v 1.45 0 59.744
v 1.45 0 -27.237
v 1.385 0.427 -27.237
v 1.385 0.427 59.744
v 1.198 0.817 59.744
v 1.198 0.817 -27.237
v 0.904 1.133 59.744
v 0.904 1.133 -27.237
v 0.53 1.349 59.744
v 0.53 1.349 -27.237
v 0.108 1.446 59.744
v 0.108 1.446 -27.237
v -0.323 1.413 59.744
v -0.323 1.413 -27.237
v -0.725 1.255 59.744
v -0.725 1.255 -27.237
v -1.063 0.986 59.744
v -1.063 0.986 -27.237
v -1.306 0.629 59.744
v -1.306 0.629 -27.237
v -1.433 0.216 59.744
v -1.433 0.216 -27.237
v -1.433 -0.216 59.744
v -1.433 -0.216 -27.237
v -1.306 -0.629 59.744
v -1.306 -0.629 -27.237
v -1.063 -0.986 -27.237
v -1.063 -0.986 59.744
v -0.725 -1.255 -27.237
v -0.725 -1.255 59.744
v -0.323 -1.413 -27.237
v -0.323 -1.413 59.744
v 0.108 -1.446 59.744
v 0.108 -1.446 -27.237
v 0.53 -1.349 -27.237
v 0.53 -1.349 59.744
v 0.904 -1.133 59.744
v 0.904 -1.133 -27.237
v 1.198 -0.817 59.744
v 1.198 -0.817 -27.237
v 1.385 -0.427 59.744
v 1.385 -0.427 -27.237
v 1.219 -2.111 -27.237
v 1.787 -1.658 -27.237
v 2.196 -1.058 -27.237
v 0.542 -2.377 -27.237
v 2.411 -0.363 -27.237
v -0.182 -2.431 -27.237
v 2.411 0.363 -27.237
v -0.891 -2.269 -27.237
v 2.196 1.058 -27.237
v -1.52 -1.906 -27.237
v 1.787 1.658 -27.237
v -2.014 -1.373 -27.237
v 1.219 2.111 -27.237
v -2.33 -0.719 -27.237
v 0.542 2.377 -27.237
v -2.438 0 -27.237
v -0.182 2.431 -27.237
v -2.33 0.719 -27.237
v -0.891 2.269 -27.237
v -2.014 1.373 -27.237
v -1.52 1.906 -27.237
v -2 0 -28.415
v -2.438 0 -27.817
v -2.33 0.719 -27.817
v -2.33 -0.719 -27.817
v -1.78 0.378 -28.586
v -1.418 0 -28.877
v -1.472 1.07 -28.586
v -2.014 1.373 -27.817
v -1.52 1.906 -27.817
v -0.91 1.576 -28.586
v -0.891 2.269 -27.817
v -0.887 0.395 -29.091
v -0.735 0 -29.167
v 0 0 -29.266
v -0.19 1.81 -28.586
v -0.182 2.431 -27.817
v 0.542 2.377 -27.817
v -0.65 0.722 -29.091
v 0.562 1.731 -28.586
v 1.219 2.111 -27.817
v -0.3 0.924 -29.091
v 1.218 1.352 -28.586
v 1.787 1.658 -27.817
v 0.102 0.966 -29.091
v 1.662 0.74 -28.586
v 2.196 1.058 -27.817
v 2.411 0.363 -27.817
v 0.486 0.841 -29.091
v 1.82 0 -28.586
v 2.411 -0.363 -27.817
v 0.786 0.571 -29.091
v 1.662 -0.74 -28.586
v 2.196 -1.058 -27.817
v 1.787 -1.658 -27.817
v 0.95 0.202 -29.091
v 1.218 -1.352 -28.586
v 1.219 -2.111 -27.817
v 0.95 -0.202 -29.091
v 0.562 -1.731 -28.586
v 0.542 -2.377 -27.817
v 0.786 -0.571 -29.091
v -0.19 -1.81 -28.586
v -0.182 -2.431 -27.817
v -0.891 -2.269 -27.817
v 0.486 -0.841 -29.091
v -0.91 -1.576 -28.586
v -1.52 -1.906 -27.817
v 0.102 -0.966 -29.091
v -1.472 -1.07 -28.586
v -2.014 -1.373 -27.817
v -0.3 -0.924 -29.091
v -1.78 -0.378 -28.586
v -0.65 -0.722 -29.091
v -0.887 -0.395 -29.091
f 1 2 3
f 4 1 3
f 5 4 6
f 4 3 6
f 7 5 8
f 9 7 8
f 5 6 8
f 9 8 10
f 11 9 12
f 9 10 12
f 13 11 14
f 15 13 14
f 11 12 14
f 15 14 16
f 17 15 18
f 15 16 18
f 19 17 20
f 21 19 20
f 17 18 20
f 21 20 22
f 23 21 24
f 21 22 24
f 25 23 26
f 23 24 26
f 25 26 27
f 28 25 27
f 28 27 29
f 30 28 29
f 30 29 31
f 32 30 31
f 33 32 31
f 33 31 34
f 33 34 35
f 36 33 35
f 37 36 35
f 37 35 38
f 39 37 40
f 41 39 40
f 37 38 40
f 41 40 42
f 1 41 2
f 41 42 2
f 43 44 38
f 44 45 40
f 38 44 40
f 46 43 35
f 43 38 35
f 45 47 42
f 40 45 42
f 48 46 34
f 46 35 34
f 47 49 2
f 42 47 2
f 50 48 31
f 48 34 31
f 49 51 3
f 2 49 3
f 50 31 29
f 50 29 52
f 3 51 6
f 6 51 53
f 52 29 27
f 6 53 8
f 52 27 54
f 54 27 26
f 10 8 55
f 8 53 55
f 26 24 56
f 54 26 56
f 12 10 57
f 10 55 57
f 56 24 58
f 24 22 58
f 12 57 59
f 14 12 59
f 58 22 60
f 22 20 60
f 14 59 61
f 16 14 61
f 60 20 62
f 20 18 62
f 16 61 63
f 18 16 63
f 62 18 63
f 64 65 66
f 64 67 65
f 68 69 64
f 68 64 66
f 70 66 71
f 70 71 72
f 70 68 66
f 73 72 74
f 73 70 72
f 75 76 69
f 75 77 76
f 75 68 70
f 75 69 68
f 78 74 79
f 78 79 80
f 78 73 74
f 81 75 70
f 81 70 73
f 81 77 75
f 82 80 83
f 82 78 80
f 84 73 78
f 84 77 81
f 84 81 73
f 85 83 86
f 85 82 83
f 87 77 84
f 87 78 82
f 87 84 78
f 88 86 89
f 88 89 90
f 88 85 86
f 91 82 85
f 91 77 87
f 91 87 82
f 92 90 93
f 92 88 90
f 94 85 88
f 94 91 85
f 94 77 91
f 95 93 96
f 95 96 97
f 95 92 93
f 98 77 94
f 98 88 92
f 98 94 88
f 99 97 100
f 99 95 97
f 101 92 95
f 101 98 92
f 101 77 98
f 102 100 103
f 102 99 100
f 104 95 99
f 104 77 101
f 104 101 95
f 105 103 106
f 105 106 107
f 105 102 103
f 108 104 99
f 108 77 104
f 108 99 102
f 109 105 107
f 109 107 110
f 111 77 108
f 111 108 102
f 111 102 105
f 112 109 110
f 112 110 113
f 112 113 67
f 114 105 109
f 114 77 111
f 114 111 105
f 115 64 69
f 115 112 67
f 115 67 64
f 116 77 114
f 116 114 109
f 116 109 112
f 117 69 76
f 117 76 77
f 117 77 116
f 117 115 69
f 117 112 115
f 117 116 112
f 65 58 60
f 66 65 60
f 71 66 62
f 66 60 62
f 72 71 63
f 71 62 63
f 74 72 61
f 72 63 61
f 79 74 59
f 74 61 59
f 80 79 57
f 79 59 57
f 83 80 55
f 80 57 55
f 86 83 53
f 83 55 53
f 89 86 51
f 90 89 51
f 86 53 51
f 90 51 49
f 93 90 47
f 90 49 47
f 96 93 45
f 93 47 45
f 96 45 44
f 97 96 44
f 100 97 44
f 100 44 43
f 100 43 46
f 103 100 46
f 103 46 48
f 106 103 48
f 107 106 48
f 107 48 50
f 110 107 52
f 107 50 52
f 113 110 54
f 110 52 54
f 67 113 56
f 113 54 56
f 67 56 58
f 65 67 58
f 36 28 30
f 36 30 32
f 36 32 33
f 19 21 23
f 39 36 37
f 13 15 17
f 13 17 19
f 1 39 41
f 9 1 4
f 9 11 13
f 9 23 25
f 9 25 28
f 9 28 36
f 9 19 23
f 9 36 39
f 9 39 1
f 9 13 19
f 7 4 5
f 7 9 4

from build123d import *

# Parameters (mm, degrees)
SKETCH1_R           = 0.5
BOSS_EXTRUDE1_DEPTH = 30
SKETCH2_R           = 0.840836639
BOSS_EXTRUDE2_DEPTH = 0.2
DOME1_FACE_RADIUS   = 0.840836639
DOME1_HEIGHT        = 0.5
SCALE1_SCALE        = 1.9329
SCALE2_SCALE        = 1.5


with BuildPart() as part:
    # Sketch1 → Boss-Extrude1 (new body)
    with BuildSketch(Plane.XY):
        Circle(SKETCH1_R)
    extrude(amount=BOSS_EXTRUDE1_DEPTH)

    # Sketch2 → Boss-Extrude2 (add)
    with BuildSketch(Plane(origin=(0, 0, 0), x_dir=(-1, 0, 0), z_dir=(0, 0, -1))):
        Circle(SKETCH2_R)
    extrude(amount=BOSS_EXTRUDE2_DEPTH)

    # Dome1: a dome of height H over a round flat face of radius A is a cap of a sphere of radius (A * A + H * H) / (2 * H)
    dome1_r = (DOME1_FACE_RADIUS * DOME1_FACE_RADIUS + DOME1_HEIGHT * DOME1_HEIGHT) / (2 * DOME1_HEIGHT)
    dome1_base = Plane((0, 0, -0.2), z_dir=(0, 0, -1))
    with Locations(dome1_base.offset(DOME1_HEIGHT - dome1_r)):
        dome1_ball = Sphere(dome1_r, mode=Mode.PRIVATE)
    add(split(dome1_ball, bisect_by=dome1_base, keep=Keep.TOP, mode=Mode.PRIVATE))


with BuildPart() as part_1:
    # Scale1: scaled about (0, 0, 14.340078406)
    add(part.part.scale(SCALE1_SCALE).moved(Location((0, 0, -13.377859145))))


with BuildPart() as part_2:
    # Scale2: scaled about (0, 0, 14.340078406)
    add(part_1.part.scale(SCALE2_SCALE).moved(Location((0, 0, -7.170039203))))


solid = part_2.part
